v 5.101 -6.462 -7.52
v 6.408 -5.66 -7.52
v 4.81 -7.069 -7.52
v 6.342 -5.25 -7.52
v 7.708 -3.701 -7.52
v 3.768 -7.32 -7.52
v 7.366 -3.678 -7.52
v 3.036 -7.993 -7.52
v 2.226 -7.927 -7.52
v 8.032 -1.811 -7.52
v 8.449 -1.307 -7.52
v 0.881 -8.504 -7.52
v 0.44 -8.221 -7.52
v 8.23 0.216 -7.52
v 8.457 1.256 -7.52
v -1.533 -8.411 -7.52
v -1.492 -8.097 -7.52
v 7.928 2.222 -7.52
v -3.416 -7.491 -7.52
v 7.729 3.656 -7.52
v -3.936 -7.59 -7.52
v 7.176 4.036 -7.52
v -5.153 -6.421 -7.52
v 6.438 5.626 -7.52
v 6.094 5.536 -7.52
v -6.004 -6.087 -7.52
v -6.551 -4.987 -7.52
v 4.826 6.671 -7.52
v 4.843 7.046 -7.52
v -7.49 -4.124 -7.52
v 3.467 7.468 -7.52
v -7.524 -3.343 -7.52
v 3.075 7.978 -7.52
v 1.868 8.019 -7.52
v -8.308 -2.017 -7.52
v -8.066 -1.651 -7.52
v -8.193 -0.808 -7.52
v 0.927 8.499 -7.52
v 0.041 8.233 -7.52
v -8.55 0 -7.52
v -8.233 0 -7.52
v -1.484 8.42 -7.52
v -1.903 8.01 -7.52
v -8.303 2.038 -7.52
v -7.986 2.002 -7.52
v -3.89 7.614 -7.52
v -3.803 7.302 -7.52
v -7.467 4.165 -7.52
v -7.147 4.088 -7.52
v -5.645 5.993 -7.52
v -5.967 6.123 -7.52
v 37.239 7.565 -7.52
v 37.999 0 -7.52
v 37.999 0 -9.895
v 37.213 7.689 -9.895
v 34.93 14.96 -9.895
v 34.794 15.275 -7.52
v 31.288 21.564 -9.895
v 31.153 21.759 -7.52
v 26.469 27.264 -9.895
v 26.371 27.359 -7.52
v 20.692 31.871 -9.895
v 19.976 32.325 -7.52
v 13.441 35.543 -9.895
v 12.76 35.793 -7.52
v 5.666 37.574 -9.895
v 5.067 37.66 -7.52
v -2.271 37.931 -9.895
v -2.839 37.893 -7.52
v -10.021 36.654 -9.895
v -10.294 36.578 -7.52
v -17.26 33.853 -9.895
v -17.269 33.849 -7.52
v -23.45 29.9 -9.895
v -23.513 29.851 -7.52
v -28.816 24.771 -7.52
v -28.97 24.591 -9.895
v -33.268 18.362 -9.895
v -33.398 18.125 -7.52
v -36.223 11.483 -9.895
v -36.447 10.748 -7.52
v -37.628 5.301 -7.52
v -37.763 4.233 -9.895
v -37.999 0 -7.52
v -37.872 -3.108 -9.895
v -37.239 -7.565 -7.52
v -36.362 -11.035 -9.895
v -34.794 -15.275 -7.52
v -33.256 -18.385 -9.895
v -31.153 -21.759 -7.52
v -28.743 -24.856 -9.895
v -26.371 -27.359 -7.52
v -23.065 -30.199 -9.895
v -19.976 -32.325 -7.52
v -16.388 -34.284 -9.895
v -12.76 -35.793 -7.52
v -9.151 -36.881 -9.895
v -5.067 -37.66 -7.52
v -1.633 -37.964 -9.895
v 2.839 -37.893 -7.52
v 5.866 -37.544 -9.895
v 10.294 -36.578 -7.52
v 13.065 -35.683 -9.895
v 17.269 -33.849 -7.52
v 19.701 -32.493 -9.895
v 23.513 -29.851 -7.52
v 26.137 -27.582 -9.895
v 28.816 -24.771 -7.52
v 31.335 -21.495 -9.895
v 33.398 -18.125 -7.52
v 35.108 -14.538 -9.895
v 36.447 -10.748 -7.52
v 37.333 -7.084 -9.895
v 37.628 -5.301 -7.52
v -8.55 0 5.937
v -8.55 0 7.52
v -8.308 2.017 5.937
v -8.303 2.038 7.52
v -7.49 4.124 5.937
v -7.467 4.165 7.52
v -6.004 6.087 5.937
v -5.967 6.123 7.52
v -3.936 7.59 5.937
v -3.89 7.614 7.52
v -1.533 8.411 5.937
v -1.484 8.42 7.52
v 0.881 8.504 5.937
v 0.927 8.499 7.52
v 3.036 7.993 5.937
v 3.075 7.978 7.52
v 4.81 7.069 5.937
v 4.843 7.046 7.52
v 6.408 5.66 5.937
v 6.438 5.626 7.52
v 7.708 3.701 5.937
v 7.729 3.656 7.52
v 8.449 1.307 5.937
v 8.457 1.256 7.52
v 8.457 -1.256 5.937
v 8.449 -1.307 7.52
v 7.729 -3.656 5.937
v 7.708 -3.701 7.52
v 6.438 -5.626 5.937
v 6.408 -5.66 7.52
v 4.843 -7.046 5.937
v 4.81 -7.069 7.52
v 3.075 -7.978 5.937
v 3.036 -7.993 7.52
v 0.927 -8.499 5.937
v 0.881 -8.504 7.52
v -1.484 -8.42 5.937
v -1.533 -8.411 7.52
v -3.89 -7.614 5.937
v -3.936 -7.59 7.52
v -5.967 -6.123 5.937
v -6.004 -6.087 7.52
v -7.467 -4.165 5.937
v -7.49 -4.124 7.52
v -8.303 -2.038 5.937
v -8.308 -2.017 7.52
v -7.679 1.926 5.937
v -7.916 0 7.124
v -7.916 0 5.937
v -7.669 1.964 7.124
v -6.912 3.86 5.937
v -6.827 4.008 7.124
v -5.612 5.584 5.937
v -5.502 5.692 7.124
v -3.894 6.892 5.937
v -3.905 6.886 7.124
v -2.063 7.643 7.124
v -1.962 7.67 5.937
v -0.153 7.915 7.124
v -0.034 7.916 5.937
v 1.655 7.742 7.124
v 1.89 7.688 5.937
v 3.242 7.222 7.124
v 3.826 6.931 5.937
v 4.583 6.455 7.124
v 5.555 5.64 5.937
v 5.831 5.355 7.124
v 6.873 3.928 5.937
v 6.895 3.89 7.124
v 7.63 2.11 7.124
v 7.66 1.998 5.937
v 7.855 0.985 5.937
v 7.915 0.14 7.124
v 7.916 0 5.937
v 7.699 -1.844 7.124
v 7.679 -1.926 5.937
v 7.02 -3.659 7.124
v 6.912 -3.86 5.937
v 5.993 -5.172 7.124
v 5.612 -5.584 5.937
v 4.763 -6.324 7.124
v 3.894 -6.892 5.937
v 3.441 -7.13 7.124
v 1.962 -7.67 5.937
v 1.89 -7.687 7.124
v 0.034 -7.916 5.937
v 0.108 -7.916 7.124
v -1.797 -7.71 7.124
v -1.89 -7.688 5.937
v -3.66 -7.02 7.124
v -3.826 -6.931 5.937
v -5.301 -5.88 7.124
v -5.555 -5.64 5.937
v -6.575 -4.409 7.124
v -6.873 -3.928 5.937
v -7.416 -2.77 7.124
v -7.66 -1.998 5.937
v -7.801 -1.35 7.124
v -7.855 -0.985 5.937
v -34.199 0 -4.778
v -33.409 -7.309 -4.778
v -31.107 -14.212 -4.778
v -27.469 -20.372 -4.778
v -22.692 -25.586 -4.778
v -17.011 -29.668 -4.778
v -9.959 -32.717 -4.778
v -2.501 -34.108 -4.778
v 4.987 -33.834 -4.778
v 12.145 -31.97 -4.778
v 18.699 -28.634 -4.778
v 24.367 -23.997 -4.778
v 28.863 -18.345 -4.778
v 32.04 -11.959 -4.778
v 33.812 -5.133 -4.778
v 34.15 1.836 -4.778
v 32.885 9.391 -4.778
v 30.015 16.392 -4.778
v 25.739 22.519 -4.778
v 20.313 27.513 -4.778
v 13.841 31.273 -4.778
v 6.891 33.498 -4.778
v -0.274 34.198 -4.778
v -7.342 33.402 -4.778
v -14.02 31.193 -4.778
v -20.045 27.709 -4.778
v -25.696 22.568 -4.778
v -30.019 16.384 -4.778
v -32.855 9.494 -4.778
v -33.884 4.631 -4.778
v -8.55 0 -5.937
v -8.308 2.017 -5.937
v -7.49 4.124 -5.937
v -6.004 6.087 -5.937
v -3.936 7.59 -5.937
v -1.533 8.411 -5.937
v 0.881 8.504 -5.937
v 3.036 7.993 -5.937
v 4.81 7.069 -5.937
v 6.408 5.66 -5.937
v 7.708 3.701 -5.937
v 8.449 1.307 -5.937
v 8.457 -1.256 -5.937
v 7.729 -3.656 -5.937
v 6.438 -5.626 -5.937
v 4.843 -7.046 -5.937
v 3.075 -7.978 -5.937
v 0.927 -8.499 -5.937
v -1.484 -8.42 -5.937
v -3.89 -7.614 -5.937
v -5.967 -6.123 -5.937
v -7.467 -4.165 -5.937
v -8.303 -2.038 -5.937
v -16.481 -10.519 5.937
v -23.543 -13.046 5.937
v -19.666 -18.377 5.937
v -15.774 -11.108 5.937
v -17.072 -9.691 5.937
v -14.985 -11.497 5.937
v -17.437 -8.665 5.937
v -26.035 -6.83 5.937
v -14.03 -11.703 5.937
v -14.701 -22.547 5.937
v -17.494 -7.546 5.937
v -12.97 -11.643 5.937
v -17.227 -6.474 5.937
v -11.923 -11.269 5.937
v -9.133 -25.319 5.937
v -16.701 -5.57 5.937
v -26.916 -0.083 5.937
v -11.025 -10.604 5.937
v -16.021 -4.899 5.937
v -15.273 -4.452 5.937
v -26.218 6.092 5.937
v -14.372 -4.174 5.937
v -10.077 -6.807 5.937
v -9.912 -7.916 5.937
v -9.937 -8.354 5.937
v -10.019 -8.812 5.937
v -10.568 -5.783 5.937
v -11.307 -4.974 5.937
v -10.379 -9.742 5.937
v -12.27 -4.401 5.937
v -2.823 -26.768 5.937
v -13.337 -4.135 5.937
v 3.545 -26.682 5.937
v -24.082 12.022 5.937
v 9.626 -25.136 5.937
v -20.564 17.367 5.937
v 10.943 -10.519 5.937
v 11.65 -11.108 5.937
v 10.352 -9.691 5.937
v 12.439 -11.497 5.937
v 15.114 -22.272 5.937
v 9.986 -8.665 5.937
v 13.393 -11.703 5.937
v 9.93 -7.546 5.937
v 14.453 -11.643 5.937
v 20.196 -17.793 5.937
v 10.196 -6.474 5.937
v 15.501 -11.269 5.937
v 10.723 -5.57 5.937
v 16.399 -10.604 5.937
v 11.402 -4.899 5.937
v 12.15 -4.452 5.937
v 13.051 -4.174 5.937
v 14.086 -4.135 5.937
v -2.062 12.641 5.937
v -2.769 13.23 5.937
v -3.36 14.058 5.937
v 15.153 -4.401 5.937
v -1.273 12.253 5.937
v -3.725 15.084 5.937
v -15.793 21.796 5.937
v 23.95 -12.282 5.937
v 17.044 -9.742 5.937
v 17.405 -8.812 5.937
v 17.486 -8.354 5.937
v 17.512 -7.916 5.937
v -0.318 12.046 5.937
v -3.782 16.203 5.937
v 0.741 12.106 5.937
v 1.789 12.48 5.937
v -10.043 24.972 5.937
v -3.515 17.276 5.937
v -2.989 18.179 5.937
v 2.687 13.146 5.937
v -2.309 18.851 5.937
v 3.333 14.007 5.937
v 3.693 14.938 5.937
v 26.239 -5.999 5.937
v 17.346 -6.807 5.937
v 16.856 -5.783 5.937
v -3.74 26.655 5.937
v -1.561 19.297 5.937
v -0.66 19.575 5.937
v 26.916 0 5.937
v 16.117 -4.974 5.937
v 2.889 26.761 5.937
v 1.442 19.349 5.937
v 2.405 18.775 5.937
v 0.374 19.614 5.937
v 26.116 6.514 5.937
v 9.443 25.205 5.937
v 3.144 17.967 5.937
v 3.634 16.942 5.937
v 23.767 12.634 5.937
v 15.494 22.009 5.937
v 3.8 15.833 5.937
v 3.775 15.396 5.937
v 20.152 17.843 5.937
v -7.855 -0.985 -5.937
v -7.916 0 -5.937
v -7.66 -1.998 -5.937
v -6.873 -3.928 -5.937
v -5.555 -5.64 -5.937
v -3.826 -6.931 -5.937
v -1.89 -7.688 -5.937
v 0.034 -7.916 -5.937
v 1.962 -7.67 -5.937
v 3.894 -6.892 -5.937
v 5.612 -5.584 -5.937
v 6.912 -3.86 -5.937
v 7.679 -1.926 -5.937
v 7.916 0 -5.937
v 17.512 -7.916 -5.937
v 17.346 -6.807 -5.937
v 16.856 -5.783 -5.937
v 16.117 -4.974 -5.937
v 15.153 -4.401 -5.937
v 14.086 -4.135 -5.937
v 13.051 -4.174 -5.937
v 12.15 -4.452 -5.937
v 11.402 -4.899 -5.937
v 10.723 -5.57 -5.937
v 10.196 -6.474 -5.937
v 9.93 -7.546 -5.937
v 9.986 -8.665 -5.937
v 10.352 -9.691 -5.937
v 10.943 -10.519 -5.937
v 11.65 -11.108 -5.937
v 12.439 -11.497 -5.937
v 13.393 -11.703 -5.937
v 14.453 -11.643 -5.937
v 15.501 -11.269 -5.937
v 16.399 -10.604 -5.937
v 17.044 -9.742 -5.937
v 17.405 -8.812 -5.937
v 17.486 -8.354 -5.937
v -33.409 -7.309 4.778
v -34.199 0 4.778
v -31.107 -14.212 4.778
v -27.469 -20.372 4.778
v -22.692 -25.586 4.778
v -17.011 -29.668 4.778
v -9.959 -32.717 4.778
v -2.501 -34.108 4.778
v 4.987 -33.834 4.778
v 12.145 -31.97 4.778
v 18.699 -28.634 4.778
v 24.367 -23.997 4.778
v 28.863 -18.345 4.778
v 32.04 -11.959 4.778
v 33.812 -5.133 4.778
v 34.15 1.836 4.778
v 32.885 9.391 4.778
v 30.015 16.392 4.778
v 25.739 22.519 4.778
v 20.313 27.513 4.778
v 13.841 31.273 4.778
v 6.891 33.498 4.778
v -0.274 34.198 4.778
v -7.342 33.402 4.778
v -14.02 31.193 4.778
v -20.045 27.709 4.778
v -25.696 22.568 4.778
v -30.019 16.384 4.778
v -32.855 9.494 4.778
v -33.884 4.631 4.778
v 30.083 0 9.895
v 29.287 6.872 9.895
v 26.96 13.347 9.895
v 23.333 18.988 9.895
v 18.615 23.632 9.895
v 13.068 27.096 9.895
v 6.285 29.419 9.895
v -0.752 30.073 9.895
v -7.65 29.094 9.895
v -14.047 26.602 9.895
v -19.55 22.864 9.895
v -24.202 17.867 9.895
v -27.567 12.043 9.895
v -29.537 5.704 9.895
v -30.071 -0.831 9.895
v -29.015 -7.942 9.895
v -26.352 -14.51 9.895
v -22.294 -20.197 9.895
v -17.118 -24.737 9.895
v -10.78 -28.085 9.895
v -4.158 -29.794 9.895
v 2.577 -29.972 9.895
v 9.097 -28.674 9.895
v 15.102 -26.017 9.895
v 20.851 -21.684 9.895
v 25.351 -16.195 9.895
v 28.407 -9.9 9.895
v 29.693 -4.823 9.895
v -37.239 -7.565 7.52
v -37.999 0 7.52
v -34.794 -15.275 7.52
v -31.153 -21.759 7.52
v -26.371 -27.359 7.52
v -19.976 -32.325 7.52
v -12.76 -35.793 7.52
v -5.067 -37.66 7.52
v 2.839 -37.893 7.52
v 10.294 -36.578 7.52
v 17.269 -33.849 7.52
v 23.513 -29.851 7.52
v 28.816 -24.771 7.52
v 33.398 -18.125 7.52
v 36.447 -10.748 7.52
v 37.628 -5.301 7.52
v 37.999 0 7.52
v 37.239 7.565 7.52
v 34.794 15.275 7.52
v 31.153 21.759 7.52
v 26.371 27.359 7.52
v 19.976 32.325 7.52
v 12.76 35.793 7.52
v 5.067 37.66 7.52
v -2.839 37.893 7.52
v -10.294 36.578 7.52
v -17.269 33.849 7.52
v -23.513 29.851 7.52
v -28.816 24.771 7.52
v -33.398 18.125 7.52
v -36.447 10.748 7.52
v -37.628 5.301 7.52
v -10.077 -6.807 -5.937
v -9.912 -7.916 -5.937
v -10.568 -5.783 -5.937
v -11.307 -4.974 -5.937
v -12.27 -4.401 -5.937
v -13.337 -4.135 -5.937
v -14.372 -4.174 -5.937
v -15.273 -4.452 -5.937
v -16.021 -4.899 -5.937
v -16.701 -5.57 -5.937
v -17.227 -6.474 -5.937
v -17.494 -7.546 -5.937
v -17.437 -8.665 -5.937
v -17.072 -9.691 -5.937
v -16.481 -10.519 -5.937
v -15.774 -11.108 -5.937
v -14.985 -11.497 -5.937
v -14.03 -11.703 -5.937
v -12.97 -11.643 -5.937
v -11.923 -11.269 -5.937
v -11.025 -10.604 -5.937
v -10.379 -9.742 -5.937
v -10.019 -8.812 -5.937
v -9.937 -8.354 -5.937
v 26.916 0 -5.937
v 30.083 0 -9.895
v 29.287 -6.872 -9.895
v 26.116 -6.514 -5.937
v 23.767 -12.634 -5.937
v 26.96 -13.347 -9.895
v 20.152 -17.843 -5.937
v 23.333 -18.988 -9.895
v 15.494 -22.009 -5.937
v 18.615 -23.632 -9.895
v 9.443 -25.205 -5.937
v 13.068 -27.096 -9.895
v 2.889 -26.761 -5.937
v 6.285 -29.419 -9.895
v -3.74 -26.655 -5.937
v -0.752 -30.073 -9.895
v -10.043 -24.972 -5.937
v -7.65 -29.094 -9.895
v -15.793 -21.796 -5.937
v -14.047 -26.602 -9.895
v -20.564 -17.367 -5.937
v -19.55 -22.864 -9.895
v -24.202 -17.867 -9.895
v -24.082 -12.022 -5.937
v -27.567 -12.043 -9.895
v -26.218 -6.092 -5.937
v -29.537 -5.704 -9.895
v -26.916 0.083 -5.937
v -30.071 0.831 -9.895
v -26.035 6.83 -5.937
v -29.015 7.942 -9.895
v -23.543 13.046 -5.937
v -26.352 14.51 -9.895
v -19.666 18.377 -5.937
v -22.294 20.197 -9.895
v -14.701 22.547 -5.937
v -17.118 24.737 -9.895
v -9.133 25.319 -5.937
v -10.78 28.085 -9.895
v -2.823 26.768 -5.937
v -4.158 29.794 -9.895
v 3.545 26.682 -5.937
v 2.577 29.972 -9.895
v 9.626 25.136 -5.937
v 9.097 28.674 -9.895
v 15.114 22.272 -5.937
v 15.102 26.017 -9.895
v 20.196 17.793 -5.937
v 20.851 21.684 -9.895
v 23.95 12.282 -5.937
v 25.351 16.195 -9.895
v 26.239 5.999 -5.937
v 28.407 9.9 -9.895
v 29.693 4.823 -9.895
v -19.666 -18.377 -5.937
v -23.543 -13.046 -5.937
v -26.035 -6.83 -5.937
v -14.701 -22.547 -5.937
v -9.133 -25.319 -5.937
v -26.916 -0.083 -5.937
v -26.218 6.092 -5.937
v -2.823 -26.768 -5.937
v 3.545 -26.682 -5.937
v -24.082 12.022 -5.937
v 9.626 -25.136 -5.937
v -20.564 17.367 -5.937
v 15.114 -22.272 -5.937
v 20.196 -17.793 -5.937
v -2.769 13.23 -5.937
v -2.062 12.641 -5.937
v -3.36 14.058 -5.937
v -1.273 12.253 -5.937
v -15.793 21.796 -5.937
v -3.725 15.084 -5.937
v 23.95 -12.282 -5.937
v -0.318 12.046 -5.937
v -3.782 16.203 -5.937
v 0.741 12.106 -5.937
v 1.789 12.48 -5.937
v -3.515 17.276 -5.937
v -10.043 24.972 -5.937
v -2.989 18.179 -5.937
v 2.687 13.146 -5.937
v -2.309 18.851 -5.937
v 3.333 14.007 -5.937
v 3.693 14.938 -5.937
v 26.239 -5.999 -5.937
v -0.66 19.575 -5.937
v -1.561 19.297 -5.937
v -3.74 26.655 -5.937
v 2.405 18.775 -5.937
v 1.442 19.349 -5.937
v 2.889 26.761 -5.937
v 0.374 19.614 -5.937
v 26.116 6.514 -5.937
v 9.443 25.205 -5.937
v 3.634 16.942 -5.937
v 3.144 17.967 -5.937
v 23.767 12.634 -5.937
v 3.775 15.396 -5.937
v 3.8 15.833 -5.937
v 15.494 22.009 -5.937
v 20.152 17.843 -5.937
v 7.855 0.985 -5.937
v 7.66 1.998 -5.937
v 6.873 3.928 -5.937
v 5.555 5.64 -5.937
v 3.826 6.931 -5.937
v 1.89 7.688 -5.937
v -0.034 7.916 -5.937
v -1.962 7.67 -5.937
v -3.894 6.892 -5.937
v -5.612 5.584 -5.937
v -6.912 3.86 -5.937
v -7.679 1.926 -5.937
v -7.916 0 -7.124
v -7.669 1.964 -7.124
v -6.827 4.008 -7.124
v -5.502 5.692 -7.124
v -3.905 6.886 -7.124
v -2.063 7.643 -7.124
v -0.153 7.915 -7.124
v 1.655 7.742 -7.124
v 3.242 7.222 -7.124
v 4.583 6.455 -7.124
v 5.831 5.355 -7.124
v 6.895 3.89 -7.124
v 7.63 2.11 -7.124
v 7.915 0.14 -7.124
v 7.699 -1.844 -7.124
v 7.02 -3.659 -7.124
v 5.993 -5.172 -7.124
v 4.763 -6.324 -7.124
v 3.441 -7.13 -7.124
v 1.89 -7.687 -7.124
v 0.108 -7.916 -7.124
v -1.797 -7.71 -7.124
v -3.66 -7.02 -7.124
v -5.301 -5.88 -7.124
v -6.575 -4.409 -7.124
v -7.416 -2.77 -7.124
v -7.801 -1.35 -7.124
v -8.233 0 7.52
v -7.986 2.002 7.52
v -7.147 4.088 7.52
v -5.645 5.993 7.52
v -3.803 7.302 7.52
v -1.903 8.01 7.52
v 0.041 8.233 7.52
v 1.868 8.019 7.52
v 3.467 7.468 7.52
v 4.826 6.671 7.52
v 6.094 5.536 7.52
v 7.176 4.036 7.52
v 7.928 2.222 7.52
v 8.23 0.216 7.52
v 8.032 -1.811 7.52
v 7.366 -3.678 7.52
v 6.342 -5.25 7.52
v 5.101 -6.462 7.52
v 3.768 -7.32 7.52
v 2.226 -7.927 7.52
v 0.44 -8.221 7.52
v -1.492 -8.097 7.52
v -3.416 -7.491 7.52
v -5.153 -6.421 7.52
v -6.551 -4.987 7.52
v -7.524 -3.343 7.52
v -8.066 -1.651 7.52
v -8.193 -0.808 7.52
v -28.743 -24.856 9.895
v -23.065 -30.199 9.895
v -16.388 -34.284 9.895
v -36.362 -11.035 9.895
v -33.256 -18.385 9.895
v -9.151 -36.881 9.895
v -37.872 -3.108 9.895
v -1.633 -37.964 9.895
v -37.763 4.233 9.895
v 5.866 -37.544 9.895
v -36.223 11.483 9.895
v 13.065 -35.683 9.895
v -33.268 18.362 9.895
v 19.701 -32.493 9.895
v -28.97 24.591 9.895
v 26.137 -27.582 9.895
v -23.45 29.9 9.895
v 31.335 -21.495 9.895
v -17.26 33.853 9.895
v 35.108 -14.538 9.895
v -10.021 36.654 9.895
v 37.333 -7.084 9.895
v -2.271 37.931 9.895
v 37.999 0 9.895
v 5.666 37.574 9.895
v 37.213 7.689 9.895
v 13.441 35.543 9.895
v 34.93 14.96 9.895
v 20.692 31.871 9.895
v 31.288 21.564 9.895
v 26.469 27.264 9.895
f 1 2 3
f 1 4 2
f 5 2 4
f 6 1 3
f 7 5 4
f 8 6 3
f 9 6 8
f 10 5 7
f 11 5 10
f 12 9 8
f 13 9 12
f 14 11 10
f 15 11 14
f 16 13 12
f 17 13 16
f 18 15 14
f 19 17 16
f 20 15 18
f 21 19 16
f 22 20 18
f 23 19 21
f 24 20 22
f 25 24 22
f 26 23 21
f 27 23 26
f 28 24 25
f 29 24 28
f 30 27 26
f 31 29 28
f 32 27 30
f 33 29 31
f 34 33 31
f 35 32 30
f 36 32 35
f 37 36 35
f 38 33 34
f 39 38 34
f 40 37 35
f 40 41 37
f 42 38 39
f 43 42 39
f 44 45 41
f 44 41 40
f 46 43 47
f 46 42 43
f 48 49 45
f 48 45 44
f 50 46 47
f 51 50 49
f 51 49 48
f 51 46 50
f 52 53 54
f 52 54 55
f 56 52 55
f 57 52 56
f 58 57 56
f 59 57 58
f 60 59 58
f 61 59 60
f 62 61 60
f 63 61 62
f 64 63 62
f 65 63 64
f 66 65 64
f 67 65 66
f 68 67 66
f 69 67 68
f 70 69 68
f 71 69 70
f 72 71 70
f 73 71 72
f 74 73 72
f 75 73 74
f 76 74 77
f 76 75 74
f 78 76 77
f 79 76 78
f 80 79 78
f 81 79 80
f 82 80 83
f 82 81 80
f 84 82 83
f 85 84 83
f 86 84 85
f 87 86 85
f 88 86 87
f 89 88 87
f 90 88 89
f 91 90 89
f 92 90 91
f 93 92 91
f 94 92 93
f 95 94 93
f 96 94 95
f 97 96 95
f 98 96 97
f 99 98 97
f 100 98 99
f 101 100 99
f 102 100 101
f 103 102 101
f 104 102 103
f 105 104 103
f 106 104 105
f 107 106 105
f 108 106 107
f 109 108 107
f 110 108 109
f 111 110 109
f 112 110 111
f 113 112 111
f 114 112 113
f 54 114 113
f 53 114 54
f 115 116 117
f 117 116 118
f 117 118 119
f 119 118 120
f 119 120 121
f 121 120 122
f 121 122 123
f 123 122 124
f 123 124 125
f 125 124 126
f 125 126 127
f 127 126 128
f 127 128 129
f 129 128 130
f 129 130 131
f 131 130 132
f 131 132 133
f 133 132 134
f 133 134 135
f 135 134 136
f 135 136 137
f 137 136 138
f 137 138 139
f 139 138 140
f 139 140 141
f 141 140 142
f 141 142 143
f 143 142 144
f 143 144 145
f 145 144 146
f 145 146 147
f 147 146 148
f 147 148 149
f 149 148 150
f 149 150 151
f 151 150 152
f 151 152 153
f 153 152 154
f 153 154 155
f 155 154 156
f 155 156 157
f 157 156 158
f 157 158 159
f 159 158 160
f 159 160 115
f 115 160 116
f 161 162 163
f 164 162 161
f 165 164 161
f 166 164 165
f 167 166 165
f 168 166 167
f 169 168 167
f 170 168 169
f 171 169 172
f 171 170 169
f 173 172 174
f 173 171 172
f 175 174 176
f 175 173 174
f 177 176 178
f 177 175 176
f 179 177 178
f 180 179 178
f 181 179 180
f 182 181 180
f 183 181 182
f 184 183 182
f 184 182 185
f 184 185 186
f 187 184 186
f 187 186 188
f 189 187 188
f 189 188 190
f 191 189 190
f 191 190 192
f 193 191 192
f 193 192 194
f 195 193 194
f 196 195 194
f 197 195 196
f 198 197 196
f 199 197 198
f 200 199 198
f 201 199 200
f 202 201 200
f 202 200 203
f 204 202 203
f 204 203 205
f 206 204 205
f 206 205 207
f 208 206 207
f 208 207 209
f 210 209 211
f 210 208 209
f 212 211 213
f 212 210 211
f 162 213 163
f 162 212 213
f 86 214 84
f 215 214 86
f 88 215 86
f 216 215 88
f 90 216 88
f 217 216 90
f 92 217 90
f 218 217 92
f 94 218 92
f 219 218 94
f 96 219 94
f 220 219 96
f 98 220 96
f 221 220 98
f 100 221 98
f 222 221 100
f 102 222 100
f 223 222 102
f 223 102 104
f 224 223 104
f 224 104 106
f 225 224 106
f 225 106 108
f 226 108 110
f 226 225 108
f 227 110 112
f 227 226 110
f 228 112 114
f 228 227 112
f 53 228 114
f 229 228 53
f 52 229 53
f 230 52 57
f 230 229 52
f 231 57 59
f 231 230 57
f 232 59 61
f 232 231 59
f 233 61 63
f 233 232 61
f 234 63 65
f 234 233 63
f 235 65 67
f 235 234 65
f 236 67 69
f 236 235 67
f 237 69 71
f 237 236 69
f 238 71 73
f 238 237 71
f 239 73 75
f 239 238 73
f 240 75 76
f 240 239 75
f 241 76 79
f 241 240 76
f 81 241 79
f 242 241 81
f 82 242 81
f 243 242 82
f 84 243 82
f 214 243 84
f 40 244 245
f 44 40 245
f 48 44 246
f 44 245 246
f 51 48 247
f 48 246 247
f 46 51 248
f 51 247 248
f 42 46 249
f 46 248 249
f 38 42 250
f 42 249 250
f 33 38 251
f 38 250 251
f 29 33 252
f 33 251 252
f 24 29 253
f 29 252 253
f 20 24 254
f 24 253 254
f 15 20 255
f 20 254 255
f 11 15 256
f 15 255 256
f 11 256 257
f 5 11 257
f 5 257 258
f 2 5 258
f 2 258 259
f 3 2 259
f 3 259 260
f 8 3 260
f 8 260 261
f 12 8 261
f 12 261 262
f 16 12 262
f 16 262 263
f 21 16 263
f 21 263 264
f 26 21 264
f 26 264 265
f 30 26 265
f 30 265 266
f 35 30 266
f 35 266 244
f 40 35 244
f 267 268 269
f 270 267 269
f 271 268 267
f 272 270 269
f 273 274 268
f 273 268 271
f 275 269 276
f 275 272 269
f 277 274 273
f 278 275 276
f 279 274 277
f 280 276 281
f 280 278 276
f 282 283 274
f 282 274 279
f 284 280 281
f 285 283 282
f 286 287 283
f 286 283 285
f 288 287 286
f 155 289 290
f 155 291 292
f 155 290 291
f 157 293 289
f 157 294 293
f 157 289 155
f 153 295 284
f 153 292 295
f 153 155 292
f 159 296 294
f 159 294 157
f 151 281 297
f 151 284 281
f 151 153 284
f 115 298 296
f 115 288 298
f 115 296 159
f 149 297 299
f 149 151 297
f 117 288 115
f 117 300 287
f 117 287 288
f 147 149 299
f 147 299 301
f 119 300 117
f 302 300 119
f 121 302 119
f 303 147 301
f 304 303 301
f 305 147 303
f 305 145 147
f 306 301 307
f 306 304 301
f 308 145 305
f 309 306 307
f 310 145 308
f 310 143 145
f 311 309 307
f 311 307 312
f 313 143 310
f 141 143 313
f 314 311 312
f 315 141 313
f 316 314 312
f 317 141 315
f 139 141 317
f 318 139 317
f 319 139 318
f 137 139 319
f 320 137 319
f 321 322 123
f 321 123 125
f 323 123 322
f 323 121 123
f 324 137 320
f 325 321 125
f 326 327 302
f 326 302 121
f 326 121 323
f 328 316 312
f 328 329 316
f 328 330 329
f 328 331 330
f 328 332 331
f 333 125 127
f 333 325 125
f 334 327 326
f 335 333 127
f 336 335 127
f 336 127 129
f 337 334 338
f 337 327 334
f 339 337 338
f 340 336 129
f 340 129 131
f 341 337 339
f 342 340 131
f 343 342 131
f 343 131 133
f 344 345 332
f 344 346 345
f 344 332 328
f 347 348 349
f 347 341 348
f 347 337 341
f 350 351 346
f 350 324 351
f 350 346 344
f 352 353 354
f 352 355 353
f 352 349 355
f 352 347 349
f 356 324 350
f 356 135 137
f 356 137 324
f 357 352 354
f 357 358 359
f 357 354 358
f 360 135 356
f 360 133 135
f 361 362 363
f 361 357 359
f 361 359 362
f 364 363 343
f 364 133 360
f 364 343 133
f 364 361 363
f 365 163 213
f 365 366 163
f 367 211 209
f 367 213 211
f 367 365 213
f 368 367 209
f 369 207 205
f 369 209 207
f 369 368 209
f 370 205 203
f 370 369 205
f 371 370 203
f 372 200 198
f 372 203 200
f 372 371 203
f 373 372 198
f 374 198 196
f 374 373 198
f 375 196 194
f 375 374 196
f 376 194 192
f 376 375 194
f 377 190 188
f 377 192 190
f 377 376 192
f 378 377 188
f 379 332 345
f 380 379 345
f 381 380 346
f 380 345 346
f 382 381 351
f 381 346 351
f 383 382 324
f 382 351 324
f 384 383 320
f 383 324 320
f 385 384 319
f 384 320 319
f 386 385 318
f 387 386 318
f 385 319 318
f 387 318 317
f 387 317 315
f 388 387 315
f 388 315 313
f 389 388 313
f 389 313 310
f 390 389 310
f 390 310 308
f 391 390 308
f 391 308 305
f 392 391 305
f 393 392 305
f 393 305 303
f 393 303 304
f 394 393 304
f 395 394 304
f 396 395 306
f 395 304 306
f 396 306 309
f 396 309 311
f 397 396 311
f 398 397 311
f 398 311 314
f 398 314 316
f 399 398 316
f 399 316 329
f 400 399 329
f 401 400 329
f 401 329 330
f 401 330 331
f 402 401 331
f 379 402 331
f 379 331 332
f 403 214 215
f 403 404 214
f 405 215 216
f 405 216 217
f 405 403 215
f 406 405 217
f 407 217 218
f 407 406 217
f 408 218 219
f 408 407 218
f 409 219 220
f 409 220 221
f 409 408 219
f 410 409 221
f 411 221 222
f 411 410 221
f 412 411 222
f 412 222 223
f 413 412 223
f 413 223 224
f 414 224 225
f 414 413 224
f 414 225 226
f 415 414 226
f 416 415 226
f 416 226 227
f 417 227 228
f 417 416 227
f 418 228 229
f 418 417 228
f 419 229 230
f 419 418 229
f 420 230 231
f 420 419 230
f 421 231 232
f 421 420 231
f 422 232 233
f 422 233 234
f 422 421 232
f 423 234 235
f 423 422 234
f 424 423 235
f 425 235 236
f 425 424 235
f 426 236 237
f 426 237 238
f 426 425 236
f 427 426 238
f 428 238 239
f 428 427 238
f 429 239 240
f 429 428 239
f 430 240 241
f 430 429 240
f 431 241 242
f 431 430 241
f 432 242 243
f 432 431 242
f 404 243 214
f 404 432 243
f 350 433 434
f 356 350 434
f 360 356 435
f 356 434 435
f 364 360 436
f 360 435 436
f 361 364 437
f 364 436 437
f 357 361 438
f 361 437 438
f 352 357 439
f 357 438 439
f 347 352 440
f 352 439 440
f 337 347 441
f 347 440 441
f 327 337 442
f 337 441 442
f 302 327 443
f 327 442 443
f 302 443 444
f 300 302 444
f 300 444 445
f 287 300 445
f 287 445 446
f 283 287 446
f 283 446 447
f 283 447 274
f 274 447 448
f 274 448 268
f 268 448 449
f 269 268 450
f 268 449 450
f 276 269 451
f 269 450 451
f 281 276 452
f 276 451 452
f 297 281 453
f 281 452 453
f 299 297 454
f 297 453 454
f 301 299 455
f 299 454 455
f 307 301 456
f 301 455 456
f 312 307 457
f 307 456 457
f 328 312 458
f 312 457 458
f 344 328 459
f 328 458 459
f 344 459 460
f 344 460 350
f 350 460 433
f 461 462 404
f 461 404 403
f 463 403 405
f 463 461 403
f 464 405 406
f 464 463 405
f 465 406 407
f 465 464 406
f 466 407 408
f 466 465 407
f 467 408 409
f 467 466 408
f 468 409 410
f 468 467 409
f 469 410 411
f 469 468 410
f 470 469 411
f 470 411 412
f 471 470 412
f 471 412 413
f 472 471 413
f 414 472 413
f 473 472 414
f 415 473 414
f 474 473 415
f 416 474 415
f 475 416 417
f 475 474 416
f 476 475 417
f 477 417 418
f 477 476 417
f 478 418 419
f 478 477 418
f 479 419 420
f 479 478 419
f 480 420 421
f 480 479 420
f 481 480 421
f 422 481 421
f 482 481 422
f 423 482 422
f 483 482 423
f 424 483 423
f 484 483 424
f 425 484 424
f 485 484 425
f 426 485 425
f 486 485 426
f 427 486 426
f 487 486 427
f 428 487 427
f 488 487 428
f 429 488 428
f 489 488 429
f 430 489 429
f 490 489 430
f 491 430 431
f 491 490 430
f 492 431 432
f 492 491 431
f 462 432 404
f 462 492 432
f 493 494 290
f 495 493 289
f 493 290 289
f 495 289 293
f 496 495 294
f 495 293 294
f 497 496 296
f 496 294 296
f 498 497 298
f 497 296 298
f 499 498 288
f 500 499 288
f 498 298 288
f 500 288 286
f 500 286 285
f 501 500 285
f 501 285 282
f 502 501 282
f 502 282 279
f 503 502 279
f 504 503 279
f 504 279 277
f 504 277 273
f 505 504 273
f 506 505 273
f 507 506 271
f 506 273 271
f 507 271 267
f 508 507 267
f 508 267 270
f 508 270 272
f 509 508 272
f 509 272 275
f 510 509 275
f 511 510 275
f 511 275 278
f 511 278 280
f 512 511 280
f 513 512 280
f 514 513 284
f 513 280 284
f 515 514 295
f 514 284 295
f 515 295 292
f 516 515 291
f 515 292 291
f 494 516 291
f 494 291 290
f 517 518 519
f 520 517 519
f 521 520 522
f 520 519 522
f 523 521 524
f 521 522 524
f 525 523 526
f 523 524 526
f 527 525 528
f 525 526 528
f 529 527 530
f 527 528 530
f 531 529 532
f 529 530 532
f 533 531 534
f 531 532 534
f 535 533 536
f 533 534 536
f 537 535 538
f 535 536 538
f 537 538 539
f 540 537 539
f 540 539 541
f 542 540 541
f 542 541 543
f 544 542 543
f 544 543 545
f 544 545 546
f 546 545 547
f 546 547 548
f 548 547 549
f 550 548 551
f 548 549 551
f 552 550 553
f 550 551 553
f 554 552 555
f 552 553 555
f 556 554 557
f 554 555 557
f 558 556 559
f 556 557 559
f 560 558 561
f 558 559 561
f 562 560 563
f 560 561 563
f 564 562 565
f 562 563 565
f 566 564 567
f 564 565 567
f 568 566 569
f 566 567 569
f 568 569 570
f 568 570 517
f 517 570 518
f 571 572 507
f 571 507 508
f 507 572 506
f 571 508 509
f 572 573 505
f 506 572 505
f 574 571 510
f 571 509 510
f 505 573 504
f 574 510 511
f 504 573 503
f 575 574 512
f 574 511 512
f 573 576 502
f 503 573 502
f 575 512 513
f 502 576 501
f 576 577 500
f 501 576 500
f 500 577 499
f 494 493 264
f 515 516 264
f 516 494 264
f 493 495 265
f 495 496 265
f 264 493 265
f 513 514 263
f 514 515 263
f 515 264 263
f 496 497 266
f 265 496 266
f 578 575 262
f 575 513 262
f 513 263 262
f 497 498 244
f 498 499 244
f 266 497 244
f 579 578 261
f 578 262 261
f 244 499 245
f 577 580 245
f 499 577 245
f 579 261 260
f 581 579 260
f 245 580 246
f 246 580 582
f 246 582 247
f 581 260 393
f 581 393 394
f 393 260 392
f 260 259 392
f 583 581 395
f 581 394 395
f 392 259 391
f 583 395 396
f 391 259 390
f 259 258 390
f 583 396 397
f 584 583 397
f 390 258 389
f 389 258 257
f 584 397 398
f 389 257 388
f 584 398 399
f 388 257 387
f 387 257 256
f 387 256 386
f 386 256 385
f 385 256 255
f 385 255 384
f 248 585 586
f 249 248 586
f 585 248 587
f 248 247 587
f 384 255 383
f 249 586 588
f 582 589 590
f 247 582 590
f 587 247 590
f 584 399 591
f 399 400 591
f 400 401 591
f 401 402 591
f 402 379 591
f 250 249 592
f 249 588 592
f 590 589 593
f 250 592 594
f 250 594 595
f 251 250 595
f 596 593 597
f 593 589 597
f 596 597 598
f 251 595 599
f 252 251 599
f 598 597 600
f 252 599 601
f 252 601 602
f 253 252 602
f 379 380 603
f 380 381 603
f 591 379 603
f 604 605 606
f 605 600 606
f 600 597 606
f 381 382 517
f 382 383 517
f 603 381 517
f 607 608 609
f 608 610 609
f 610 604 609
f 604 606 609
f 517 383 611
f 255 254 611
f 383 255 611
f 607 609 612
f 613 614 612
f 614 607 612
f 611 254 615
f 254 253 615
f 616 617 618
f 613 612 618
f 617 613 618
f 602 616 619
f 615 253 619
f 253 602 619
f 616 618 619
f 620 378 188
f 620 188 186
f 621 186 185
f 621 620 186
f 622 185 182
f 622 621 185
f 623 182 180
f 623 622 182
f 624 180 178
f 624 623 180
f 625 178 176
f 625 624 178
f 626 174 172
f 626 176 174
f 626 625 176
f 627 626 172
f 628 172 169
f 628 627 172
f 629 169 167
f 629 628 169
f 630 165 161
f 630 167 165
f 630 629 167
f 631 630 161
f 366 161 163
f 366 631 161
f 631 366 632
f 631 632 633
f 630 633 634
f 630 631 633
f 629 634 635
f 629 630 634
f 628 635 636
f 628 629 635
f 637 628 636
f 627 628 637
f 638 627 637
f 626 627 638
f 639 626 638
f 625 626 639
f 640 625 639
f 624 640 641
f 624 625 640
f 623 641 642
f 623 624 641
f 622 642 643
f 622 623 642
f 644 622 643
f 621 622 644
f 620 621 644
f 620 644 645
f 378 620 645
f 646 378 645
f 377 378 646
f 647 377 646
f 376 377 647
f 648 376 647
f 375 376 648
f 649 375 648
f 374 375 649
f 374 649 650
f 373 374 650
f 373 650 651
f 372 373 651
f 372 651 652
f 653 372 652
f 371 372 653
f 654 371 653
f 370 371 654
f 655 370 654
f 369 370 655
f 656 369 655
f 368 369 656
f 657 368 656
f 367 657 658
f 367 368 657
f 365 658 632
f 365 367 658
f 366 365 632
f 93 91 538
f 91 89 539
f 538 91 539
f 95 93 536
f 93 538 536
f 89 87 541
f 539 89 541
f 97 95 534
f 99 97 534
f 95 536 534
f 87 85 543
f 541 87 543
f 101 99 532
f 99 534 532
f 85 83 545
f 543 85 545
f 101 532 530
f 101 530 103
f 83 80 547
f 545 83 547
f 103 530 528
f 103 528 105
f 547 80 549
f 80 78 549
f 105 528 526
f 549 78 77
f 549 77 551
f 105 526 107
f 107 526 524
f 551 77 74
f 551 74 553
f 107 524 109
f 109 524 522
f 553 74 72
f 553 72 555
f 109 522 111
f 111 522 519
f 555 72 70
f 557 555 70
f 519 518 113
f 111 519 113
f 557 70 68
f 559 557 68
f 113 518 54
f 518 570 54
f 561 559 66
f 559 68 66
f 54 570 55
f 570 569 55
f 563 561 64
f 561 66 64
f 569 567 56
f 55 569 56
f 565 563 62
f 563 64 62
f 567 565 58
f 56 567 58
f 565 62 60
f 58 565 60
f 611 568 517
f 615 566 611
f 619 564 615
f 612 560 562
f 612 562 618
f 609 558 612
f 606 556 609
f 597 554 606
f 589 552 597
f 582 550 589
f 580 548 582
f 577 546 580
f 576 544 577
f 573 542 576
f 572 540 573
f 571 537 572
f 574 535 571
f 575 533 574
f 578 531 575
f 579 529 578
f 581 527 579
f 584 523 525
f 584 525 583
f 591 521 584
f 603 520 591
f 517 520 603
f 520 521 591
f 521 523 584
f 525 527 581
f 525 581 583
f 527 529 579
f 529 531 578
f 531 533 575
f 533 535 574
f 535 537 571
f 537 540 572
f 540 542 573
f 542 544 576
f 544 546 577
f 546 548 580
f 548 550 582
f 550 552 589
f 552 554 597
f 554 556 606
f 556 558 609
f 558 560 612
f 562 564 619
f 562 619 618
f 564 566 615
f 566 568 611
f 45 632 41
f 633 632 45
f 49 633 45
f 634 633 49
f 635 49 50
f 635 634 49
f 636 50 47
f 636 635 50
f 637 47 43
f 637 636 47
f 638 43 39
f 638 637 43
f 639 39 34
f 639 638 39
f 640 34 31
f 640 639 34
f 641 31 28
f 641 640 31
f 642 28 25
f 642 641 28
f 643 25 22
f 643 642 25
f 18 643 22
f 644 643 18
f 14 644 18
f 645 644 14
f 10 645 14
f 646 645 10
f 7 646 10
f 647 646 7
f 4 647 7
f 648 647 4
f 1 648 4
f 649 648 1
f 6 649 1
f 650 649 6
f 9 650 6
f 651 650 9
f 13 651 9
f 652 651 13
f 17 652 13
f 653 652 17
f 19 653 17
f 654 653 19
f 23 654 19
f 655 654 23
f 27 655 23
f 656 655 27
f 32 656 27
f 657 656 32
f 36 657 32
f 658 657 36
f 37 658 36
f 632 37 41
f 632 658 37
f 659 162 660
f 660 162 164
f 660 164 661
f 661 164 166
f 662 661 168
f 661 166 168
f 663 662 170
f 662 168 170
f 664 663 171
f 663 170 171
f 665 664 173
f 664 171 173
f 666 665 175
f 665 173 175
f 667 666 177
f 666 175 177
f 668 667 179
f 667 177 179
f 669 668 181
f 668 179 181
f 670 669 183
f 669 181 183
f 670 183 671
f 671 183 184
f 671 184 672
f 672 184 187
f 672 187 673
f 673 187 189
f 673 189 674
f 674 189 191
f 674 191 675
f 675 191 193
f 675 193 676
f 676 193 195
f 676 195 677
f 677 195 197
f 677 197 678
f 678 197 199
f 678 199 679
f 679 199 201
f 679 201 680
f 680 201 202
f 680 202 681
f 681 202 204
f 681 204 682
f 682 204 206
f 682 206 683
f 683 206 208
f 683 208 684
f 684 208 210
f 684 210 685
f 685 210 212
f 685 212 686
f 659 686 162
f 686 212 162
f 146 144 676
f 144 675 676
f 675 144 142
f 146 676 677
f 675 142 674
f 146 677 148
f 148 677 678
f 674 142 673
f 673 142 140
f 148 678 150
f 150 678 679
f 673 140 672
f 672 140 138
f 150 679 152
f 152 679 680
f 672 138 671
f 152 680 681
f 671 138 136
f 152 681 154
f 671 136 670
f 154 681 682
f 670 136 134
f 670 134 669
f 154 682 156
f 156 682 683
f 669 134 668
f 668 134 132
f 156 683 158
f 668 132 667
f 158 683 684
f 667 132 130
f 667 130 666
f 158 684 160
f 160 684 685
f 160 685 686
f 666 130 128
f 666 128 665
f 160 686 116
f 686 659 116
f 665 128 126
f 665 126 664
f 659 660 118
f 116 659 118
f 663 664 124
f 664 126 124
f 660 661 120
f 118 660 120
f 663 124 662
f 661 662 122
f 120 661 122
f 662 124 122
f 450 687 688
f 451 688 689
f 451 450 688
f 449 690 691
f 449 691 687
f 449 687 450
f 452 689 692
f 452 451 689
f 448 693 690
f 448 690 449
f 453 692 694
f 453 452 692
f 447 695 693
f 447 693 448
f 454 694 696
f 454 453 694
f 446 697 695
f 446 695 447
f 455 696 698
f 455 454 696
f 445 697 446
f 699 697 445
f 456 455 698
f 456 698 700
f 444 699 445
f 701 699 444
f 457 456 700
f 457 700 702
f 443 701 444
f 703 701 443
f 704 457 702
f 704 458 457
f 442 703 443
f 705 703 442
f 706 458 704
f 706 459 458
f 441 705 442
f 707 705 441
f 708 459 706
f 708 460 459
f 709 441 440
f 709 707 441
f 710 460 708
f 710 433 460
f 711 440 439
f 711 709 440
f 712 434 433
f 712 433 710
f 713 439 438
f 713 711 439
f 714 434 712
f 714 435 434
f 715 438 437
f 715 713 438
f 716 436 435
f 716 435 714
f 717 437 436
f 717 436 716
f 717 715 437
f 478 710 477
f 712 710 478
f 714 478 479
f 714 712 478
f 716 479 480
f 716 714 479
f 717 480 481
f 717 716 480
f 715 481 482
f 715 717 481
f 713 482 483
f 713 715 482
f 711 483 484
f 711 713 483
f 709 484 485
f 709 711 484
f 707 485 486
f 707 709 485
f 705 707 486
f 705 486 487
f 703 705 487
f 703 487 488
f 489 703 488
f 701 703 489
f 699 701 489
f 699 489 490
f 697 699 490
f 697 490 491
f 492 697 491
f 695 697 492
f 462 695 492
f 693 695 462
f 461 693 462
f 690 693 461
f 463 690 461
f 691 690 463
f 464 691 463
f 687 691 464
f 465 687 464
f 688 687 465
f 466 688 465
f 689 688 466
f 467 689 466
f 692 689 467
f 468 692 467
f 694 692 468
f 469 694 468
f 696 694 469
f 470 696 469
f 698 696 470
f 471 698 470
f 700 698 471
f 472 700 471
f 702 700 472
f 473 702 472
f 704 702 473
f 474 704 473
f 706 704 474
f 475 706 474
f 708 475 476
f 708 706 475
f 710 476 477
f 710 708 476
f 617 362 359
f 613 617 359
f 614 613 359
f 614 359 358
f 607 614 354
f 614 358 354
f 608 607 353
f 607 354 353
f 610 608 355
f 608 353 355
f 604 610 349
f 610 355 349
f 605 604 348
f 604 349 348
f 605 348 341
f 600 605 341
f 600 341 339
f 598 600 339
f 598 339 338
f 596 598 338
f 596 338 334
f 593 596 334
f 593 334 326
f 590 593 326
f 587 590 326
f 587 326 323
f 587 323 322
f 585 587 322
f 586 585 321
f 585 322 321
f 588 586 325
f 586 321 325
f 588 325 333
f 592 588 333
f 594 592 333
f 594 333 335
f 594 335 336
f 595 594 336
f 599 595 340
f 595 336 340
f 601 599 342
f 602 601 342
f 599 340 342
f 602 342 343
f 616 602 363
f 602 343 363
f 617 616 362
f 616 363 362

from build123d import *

# Parameters (mm, degrees)
ESQUISSE1_R             = 60
ESQUISSE1_R_2           = 12.5
BOSS_EXTRU_1_DEPTH      = 12.5
ESQUISSE3_R             = 42.5
ENL_V_MAT_EXTRU_1_DEPTH = 5
ESQUISSE4_R             = 6
ENL_V_MAT_EXTRU_2_DEPTH = 88.177978871
BOSS_EXTRU_2_DEPTH      = 2
BOSS_EXTRU_2_DEPTH_BACK = 17
ESQUISSE6_R             = 13.5
ESQUISSE6_R_2           = 12.5
CHANFREIN1_SIZE         = 5
CHANFREIN2_SIZE         = 0.5
ESCALA1_SCALE           = 0.63332
ESCALA2_SCALE_X         = 1
ESCALA2_SCALE_Y         = 1
ESCALA2_SCALE_Z         = 1.249921051


with BuildPart() as part:
    # Esquisse1 → Boss.-Extru.1 (new, symmetric)
    with BuildSketch(Plane.XY):
        Circle(ESQUISSE1_R)
        Circle(ESQUISSE1_R_2, mode=Mode.SUBTRACT)
    extrude(amount=BOSS_EXTRU_1_DEPTH, both=True)

    # Esquisse3 → Enlèv. mat.-Extru.1 (cut, symmetric)
    with BuildSketch(Plane.XY.offset(12.5)):
        Circle(ESQUISSE3_R)
    enl_v_mat_extru_1 = extrude(amount=ENL_V_MAT_EXTRU_1_DEPTH, both=True, mode=Mode.SUBTRACT)

    # Symétrie1: Enlèv. mat.-Extru.1 across plane
    add(enl_v_mat_extru_1.mirror(Plane.XY), mode=Mode.SUBTRACT)

    # Esquisse4 → Enlèv. mat.-Extru.2 (cut, through all)
    with BuildSketch(Plane.XY.offset(7.5)):
        with Locations((0, 25)):
            Circle(ESQUISSE4_R)
        with Locations((21.650635095, -12.5)):
            Circle(ESQUISSE4_R)
        with Locations((-21.650635095, -12.5)):
            Circle(ESQUISSE4_R)
    extrude(amount=-ENL_V_MAT_EXTRU_2_DEPTH, mode=Mode.SUBTRACT)

    # Esquisse5 → Enlèvement de matière-Révolution1 (revolve, cut)
    with BuildSketch(Plane(origin=(0, 0, 0), x_dir=(1, 0, 0), z_dir=(0, 1, 0)), mode=Mode.PRIVATE) as enl_vement_de_mati_re_r_volution1_sk:
        Polygon((60, 9.5), (54, 6.035898385), (54, -6.035898385), (60, -9.5), align=None)
    revolve(enl_vement_de_mati_re_r_volution1_sk.sketch.rotate(Axis((0, 0, -12.5), (0, 0, 1)), 180), axis=Axis((0, 0, -12.5), (0, 0, 1)), mode=Mode.SUBTRACT)

    # Esquisse6 → Boss.-Extru.2 (add, two sides: drawn at the far end of the back side and taken through both)
    with BuildSketch(Plane(origin=(0, 0, -7.5), x_dir=(-1, 0, 0), z_dir=(0, 0, -1)).offset(-BOSS_EXTRU_2_DEPTH_BACK)):
        Circle(ESQUISSE6_R)
        Circle(ESQUISSE6_R_2, mode=Mode.SUBTRACT)
    extrude(amount=BOSS_EXTRU_2_DEPTH + BOSS_EXTRU_2_DEPTH_BACK)

    # Chanfrein1
    chanfrein1_edges = [part.edges().sort_by_distance(p)[0] for p in [
        (-42.5, 0, 12.5),
        (-42.5, 0, -12.5),
    ]]
    chamfer(chanfrein1_edges, length=CHANFREIN1_SIZE - 0.0001)  # a hair under: the kernel refuses the full size

    # Chanfrein2
    chanfrein2_edges = [part.edges().sort_by_distance(p)[0] for p in [
        (12.5, 0, 9.5),
        (12.5, 0, -9.5),
    ]]
    chamfer(chanfrein2_edges, length=CHANFREIN2_SIZE)


with BuildPart() as part_1:
    # Escala1: scaled about (0, 0, 0)
    add(part.part.scale(ESCALA1_SCALE))


with BuildPart() as part_2:
    # Escala2: scaled about (0, 0, 0)
    add(part_1.part.scale((ESCALA2_SCALE_X, ESCALA2_SCALE_Y, ESCALA2_SCALE_Z), about=(0, 0, 0)))


solid = part_2.part
